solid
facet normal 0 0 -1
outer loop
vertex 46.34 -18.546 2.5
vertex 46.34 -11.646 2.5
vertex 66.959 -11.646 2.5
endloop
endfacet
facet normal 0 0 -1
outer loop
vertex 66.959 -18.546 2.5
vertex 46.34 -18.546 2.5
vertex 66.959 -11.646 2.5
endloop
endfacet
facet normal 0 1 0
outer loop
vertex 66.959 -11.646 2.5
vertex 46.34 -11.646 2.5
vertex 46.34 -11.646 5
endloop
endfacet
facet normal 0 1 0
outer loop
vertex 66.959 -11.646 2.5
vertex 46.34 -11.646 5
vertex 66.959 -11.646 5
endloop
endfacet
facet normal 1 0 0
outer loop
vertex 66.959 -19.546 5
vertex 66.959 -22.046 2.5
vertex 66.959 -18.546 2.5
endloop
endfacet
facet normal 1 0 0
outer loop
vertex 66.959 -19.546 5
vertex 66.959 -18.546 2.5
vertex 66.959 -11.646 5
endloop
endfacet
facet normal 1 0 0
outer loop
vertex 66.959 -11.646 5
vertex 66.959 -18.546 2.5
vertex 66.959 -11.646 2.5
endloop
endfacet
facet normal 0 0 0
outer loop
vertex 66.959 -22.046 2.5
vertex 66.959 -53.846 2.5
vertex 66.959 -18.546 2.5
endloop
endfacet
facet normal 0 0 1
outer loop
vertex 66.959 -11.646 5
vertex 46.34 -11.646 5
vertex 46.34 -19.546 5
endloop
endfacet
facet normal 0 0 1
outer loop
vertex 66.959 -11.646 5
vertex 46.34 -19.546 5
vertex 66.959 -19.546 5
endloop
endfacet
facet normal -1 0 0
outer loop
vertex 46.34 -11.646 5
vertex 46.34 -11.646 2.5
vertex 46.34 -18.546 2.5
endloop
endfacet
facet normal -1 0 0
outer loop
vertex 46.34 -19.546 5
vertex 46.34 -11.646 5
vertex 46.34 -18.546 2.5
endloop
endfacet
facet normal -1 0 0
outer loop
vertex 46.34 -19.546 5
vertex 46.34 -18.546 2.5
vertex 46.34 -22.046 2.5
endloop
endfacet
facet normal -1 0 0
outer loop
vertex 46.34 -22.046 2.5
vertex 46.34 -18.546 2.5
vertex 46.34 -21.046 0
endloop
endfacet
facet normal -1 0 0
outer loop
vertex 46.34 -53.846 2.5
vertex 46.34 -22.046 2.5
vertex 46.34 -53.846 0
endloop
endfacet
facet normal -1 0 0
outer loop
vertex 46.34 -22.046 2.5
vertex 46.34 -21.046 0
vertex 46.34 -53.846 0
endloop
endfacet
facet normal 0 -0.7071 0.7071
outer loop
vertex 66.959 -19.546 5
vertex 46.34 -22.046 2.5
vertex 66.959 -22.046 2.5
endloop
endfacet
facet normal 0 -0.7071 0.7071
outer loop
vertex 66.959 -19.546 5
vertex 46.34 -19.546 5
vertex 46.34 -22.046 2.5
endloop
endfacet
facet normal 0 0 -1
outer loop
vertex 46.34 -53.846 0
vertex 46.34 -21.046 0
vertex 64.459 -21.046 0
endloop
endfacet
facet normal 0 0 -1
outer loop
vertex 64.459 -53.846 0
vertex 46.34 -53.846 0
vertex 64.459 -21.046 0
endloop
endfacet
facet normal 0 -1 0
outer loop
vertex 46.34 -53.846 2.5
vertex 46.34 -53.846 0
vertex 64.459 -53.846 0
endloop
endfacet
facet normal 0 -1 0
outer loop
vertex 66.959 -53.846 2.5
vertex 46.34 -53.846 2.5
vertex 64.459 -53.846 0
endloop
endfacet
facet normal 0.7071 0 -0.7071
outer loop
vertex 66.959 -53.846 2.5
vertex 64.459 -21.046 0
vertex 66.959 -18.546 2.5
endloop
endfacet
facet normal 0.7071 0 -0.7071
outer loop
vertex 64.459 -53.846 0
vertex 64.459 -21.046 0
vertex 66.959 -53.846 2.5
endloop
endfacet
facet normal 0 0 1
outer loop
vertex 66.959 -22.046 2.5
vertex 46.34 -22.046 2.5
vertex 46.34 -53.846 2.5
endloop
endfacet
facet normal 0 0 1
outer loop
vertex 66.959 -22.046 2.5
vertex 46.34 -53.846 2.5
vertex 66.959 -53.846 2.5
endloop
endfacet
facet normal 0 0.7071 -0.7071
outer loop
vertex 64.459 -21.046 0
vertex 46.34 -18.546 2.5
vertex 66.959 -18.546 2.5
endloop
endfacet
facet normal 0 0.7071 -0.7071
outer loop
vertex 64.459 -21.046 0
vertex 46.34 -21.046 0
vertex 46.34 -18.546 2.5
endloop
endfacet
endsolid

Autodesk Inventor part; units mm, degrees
ref_plane "YZ Plane" through (0, 0, 0) normal (1, 0, 0) x (0, 1, 0)
ref_plane "XZ Plane" through (0, 0, 0) normal (0, 1, 0) x (-1, 0, 0)
ref_plane "XY Plane" through (0, 0, 0) normal (0, 0, 1) x (1, 0, 0)
sketch "Esboço1" plane through (0, 0, 0) normal (0, 0, 1) x (1, 0, 0)
  line L0 (66.9586, -53.8463) -> (66.9586, -18.5463)
  line L1 (66.9586, -18.5463) -> (46.3396, -18.5463)
  line L2 (46.3396, -18.5463) -> (46.3396, -53.8463)
  line L3 (46.3396, -53.8463) -> (66.9586, -53.8463)
  point P0 (0, 0)
  dimension "d0" = 35.3
  dimension "d1" = 20.619
extrude "Extrusão1" add sketch "Esboço1" along normal blind 2.5
chamfer "Chanfro1" distance 2.5 angle 45 2 edges at (56.6491, -18.5463, 0) (66.9586, -36.1963, 0)
sketch "Esboço2" plane through (0, 0, 2.5) normal (0, 0, 1) x (1, 0, 0)
  line L0 (66.9586, -18.5463) -> (46.3396, -18.5463) projected
  line L1 (46.3396, -18.5463) -> (46.3396, -11.6463)
  line L2 (46.3396, -11.6463) -> (66.9586, -11.6463)
  line L3 (66.9586, -11.6463) -> (66.9586, -18.5463)
  line L4 (66.9586, -18.5463) -> (46.3396, -18.5463)
  line L5 (46.3396, -18.5463) -> (46.3396, -19.5463)
  line L6 (46.3396, -19.5463) -> (66.9586, -19.5463)
  line L7 (66.9586, -19.5463) -> (66.9586, -18.5463)
  point P0 (0, 0)
  dimension "d7" = 6.9
  dimension "d10" = 1
extrude "Extrusão2" add sketch "Esboço2" along normal blind 2.5
chamfer "Chanfro2" distance 2.5 angle 45 1 edges at (56.6491, -19.5463, 2.5)
properties part number "suporte_placa"
